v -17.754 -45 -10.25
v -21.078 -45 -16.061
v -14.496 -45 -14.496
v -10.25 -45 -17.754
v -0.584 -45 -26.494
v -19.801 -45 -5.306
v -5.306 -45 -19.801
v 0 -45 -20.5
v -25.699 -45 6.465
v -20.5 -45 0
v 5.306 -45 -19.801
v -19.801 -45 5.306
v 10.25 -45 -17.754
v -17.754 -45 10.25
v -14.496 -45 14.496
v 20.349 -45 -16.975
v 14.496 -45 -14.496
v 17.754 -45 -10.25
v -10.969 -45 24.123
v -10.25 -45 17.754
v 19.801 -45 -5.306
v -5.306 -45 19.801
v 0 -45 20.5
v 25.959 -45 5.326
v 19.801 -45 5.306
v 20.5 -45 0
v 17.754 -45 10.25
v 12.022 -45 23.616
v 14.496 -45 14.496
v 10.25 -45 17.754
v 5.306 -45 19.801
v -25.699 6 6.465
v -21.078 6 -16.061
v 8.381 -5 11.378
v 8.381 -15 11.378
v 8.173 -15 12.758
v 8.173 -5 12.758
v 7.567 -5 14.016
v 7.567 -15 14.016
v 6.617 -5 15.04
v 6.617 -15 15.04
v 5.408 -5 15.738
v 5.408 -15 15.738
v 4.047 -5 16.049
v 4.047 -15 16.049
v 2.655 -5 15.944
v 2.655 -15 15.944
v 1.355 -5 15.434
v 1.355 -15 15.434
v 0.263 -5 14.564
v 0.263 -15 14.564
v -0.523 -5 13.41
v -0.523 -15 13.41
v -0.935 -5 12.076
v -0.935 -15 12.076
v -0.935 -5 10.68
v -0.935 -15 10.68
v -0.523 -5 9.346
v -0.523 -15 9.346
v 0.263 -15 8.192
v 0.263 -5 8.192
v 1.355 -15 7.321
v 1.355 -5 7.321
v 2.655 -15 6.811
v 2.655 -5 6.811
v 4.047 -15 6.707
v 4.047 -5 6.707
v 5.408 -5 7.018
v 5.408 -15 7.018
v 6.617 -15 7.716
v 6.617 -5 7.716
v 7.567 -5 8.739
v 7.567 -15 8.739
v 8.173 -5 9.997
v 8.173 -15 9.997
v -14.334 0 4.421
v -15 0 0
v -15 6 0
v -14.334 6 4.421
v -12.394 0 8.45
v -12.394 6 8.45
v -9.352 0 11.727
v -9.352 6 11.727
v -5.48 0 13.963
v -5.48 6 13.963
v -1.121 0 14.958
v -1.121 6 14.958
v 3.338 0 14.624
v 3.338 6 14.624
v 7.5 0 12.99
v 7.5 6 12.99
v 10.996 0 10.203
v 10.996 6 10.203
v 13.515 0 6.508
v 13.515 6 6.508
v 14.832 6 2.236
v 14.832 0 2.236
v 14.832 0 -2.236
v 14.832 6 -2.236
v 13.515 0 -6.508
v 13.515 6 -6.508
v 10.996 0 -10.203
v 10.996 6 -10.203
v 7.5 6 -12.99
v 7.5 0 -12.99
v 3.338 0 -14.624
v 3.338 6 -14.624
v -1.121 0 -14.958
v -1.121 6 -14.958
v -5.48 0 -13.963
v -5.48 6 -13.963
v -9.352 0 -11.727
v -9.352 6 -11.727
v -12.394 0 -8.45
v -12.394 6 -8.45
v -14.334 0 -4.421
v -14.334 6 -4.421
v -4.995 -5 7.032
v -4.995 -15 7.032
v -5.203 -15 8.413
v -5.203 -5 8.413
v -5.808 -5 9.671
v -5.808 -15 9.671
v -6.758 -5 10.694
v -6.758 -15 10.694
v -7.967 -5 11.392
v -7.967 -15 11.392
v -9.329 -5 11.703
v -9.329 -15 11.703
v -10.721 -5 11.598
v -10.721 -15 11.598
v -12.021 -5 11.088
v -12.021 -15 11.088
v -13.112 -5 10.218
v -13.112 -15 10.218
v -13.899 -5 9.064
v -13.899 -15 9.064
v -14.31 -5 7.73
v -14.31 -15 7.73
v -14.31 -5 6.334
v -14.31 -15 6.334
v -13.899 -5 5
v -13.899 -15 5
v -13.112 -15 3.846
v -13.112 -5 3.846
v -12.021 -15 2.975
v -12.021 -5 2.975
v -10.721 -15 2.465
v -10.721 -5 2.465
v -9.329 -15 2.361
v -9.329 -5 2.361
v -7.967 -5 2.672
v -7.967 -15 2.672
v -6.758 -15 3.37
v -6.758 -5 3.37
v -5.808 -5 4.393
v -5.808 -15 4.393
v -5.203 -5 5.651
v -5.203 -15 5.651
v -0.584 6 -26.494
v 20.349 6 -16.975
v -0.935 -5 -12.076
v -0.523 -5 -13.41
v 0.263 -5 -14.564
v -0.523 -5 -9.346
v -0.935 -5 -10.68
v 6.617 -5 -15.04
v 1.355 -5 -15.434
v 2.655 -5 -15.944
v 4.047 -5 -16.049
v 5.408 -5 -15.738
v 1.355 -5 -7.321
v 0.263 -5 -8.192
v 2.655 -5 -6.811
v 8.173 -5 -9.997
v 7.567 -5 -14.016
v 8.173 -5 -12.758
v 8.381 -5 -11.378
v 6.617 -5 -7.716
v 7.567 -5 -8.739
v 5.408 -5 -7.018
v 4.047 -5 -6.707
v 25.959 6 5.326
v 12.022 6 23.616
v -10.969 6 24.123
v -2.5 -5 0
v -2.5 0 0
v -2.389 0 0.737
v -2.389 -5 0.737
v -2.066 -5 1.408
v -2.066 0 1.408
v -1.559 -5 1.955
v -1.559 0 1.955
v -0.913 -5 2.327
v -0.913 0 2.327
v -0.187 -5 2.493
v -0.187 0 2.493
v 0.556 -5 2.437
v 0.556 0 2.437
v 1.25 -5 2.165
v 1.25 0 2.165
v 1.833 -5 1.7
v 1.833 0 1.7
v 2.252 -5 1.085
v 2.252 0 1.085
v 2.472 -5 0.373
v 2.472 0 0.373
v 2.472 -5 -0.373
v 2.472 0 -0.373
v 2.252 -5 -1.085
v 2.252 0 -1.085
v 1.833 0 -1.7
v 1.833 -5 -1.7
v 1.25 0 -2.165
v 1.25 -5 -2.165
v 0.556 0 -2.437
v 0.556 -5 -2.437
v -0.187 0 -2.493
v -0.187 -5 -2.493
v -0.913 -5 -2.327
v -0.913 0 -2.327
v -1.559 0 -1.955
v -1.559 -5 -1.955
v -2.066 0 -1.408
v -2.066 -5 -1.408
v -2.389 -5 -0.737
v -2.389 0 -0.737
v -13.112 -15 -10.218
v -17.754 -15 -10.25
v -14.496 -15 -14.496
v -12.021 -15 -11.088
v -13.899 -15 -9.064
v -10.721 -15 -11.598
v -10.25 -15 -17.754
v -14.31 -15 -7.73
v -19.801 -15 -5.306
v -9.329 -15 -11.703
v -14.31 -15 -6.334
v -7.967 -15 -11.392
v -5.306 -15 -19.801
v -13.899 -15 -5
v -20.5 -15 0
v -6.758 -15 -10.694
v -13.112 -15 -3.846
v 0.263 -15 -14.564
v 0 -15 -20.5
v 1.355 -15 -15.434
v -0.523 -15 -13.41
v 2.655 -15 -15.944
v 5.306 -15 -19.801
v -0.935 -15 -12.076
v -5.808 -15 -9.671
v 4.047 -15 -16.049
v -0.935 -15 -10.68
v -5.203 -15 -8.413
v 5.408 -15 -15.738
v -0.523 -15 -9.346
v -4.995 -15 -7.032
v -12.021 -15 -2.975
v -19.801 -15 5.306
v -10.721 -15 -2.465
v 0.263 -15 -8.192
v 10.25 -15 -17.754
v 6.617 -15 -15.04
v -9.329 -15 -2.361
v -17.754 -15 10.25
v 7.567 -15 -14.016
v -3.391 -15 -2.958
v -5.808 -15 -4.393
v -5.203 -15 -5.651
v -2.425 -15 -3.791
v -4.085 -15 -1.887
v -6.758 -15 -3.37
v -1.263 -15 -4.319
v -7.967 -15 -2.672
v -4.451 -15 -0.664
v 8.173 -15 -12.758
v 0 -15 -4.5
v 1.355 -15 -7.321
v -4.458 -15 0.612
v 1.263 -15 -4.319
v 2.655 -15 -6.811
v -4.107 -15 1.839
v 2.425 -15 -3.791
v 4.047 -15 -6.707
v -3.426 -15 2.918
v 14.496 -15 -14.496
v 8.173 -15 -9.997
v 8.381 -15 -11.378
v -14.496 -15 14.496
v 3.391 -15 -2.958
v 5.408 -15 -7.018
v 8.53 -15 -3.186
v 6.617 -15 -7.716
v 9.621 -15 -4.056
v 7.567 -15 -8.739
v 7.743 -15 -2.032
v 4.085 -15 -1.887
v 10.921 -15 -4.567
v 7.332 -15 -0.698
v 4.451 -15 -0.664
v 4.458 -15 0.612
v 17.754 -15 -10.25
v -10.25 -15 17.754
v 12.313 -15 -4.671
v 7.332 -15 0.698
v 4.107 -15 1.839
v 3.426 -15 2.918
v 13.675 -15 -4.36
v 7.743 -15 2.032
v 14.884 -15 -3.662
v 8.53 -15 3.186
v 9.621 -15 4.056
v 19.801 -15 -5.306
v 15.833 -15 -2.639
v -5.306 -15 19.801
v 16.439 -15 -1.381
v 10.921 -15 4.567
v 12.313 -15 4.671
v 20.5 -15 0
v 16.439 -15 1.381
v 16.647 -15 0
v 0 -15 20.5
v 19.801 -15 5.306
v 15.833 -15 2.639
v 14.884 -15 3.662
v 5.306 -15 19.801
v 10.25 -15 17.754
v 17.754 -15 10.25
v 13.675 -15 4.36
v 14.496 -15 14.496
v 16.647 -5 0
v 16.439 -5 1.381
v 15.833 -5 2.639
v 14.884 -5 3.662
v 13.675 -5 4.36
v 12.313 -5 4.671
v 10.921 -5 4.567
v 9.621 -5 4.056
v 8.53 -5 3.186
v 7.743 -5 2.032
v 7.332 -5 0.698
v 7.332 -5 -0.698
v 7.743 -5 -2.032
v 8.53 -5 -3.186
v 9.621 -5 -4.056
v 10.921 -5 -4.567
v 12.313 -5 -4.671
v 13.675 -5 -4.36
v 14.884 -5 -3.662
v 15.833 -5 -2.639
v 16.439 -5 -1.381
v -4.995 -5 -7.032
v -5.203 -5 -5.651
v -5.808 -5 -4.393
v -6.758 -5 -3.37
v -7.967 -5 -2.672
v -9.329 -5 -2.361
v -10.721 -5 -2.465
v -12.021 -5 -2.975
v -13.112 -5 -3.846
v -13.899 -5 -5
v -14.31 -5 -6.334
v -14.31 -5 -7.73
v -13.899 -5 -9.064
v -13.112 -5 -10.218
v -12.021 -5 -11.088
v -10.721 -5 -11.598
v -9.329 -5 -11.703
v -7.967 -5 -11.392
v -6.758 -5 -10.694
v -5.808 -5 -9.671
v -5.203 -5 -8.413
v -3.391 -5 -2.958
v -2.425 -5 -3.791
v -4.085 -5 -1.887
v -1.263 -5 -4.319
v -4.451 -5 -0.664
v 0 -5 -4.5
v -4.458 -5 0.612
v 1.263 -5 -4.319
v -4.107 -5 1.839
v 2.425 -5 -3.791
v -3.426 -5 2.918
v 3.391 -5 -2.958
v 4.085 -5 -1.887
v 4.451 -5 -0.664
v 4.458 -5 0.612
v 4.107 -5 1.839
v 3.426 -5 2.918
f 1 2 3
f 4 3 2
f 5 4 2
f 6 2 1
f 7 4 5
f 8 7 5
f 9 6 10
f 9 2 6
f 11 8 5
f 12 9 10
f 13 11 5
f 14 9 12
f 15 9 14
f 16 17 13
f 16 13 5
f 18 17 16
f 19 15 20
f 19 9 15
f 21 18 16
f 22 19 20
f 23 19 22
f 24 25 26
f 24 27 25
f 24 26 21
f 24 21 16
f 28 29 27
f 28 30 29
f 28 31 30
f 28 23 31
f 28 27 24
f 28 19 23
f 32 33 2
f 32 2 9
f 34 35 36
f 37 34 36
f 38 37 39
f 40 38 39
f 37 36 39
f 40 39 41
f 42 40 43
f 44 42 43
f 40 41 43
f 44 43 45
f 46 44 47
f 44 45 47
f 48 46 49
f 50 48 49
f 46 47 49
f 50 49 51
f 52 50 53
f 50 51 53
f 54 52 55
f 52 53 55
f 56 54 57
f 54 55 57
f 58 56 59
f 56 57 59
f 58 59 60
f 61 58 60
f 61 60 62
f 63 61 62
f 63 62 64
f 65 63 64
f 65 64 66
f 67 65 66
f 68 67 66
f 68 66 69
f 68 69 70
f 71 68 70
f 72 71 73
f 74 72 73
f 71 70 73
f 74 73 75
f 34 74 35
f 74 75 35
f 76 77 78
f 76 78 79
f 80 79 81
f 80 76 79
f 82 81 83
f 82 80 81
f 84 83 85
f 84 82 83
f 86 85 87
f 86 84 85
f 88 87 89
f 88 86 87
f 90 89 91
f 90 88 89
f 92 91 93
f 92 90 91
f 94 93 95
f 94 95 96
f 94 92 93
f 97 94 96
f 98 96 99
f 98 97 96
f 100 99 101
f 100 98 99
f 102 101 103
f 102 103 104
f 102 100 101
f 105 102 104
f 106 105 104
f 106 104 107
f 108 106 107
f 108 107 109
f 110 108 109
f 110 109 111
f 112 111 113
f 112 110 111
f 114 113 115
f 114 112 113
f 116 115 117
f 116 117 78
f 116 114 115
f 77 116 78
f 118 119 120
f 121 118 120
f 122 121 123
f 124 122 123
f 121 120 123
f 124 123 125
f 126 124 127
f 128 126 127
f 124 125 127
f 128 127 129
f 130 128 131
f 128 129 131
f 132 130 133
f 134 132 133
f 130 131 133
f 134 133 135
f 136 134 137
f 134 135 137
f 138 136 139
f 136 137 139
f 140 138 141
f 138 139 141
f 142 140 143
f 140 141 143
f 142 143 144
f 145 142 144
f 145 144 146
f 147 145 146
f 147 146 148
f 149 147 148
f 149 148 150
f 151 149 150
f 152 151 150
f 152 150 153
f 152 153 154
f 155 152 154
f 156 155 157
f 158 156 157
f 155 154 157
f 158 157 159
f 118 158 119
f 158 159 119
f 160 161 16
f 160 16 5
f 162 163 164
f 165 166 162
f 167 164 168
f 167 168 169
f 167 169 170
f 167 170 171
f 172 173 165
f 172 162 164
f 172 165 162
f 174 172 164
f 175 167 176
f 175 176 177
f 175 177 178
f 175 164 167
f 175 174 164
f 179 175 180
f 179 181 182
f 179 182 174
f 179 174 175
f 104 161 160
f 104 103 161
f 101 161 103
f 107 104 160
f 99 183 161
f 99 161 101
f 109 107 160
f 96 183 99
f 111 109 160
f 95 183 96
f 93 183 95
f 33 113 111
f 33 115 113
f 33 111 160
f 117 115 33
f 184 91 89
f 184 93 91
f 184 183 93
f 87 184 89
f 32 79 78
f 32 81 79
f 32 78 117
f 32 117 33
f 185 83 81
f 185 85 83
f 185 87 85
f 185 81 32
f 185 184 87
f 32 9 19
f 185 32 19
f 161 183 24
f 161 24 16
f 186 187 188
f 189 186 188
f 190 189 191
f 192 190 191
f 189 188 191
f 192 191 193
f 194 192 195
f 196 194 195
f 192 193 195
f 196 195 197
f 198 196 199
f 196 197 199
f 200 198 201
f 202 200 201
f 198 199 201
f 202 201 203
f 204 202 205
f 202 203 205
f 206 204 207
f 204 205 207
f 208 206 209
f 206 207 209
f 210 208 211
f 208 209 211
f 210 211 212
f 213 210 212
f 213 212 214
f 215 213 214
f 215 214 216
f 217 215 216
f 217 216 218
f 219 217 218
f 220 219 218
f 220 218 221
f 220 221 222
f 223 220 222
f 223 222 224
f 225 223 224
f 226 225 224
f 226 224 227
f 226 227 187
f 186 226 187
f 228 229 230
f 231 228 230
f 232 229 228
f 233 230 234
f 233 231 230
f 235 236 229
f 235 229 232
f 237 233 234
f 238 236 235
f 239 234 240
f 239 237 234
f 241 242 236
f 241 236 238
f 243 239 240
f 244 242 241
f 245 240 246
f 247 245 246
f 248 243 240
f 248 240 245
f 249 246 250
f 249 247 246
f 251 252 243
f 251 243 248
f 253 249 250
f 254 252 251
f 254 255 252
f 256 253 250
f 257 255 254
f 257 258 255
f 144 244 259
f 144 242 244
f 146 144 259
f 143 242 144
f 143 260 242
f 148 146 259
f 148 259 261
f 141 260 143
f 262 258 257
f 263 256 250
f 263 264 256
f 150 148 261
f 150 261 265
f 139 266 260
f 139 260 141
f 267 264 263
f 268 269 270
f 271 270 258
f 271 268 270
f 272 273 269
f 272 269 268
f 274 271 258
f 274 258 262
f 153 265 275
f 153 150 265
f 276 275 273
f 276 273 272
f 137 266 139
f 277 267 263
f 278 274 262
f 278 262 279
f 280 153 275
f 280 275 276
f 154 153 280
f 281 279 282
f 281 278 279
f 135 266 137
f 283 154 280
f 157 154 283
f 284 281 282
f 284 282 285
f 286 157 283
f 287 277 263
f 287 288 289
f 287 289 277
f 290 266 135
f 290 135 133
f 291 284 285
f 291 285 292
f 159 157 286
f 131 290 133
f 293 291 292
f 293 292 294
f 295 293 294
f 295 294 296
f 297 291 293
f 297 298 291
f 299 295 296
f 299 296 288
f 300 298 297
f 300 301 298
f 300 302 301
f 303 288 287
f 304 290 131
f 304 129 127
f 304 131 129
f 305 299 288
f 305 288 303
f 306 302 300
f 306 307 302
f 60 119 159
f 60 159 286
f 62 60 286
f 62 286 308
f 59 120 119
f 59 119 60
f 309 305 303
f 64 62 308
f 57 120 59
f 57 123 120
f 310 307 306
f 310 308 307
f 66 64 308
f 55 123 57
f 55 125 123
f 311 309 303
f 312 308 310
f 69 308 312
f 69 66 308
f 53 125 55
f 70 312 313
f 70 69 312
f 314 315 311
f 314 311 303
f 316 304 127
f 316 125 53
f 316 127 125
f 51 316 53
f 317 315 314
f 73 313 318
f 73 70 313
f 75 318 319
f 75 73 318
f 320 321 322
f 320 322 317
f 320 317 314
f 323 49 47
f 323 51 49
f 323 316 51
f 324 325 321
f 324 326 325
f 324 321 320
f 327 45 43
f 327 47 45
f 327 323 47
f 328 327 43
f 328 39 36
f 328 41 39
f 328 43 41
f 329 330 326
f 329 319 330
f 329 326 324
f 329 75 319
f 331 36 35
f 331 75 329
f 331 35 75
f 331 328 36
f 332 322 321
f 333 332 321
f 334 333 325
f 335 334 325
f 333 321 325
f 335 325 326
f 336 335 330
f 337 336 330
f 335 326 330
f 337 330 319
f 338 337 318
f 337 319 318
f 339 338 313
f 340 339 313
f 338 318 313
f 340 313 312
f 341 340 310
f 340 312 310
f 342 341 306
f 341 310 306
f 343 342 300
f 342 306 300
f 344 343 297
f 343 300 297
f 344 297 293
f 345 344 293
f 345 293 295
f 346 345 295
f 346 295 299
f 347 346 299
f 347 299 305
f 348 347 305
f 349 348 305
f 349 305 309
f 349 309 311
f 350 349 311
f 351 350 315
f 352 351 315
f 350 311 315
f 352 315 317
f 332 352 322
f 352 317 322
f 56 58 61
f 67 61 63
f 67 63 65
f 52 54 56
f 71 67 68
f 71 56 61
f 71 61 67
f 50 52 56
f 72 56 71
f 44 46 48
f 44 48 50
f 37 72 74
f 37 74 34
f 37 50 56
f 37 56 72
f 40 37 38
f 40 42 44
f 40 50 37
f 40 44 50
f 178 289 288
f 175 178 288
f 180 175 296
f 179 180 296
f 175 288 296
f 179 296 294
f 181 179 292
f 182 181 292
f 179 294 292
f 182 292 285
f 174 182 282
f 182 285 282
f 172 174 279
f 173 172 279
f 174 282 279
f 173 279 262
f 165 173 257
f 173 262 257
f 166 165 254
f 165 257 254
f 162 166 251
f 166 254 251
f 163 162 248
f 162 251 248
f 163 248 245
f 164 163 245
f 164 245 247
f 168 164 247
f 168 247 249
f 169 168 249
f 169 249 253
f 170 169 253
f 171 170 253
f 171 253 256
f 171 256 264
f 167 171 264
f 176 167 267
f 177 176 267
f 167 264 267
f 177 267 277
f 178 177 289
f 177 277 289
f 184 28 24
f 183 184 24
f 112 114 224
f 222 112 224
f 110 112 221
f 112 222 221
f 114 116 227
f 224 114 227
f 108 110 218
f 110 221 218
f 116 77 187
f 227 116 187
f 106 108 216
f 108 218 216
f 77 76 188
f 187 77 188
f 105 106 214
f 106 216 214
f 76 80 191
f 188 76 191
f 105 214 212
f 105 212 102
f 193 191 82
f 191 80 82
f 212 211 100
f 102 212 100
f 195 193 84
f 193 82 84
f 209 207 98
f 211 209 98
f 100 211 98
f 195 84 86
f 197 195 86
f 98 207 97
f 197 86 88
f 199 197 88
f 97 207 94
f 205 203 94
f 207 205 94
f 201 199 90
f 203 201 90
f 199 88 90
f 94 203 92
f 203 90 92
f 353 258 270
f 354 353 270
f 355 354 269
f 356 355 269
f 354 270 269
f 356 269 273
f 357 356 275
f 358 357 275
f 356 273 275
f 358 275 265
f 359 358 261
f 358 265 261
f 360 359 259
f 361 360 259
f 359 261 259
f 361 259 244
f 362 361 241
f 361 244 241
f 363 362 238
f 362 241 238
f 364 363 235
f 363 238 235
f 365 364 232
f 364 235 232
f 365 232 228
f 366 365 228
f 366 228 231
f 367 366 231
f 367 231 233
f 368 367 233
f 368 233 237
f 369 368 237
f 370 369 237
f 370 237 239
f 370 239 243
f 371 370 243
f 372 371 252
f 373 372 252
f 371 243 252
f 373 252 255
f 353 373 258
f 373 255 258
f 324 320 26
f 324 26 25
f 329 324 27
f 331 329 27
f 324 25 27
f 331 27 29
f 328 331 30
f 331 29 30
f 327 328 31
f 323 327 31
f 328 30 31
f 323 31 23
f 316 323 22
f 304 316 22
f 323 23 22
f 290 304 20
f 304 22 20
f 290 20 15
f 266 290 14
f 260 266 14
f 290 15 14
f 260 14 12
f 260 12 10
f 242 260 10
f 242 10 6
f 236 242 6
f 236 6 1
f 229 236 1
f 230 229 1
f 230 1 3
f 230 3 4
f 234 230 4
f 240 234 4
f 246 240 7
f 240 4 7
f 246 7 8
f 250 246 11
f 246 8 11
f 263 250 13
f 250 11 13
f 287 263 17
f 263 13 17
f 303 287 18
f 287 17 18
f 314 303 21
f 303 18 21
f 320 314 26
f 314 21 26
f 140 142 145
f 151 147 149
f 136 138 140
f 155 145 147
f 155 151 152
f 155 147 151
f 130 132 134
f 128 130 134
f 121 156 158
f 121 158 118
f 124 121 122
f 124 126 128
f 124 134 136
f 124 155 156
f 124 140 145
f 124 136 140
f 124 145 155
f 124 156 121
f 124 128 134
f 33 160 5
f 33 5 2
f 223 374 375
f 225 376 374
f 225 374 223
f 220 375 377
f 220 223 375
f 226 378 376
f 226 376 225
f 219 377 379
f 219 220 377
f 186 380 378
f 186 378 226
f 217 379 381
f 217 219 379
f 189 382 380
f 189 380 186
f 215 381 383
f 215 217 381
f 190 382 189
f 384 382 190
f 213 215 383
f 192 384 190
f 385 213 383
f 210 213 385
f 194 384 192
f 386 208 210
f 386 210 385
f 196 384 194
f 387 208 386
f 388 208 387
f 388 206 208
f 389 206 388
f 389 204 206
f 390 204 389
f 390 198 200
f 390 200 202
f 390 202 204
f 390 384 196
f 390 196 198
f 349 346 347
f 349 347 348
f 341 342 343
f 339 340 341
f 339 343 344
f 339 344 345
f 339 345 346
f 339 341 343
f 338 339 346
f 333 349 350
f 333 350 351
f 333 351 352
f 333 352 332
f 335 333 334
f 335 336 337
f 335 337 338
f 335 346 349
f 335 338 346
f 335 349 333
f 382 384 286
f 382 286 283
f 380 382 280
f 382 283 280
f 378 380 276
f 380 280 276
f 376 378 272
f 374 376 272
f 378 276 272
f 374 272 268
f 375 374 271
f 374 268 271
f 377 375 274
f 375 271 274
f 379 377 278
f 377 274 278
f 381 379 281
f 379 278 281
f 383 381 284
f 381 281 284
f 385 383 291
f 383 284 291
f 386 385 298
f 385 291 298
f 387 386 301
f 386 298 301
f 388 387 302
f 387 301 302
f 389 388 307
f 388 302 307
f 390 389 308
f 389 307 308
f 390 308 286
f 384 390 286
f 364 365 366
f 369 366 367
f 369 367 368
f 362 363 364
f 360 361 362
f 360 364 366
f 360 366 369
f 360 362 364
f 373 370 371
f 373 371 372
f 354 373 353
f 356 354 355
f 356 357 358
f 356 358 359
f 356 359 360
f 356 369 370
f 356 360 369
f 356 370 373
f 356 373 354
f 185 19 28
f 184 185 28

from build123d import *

# Parameters (mm, degrees)
F0_R      = 26.5
F1_DEPTH  = 45
F2_R      = 20.5
F3_DEPTH  = 30
F4_R      = 2.5
F5_DEPTH  = 45.001
F7_DEPTH  = 10
F9_DEPTH  = 45.001
F10_R     = 15
F11_DEPTH = 6
F12_R     = 4.6840080941
F13_DEPTH = 10


with BuildPart() as f1:
    # F0 (on Front) → F1 (new body)
    with BuildSketch(Plane.XZ):
        Circle(F0_R)
    extrude(amount=F1_DEPTH)

    # F2 (on face) → F3 (cut)
    with BuildSketch(Plane.XZ.offset(45)):
        Circle(F2_R)
    extrude(amount=-F3_DEPTH, mode=Mode.SUBTRACT)

    # F4 (on face) → F5 (cut, through all)
    with BuildSketch(Plane(origin=(0, 0, 0), x_dir=(-1, 0, 0), z_dir=(0, 1, 0))):
        Circle(F4_R)
    extrude(amount=-F5_DEPTH, mode=Mode.SUBTRACT)

    # F6 (on face) → F7 (cut)
    with BuildSketch(Plane.XZ.offset(15)):
        with BuildLine():
            Line((3.4260696722, 2.917541191), (-3.4260696722, 2.917541191))
            ThreePointArc((-3.4260696722, 2.917541191), (0, -4.5), (3.4260696722, 2.917541191))
        make_face()
    extrude(amount=-F7_DEPTH, mode=Mode.SUBTRACT)

    # F8 (on face) → F9 (cut, through all)
    with BuildSketch(Plane(origin=(0, 0, 0), x_dir=(-1, 0, 0), z_dir=(0, 1, 0))):
        with BuildLine():
            Line((-25.9593629808, 5.325549139), (-12.0217161029, 23.6162728207))
            ThreePointArc((-12.0217161029, 23.6162728207), (-21.077908703, 16.061499454), (-25.9593629808, 5.325549139))
        make_face()
        with BuildLine():
            ThreePointArc((10.9685281987, 24.1234613842), (-0.584475192, 26.4935537207), (-12.0217161029, 23.6162728207))
            Line((-12.0217161029, 23.6162728207), (10.9685281987, 24.1234613842))
        make_face()
        with BuildLine():
            ThreePointArc((25.6992470496, 6.4651914964), (20.3490800596, 16.9754216657), (10.9685281987, 24.1234613842))
            Line((10.9685281987, 24.1234613842), (25.6992470496, 6.4651914964))
        make_face()
        with BuildLine():
            ThreePointArc((26.5, 0), (26.2990498575, 3.257295902), (25.6992470496, 6.4651914964))
            Line((25.6992470496, 6.4651914964), (21.077908703, -16.061499454))
            ThreePointArc((21.077908703, -16.061499454), (25.1079129024, -8.4760078861), (26.5, 0))
        make_face()
        with BuildLine():
            ThreePointArc((0.584475192, -26.4935537207), (12.0217161029, -23.6162728207), (21.077908703, -16.061499454))
            Line((21.077908703, -16.061499454), (0.584475192, -26.4935537207))
        make_face()
        with BuildLine():
            Line((0.584475192, -26.4935537207), (-20.3490800596, -16.9754216657))
            ThreePointArc((-20.3490800596, -16.9754216657), (-10.9685281987, -24.1234613842), (0.584475192, -26.4935537207))
        make_face()
        with BuildLine():
            Line((-20.3490800596, -16.9754216657), (-25.9593629808, 5.325549139))
            ThreePointArc((-25.9593629808, 5.325549139), (-25.6992470496, -6.4651914964), (-20.3490800596, -16.9754216657))
        make_face()
    extrude(amount=-F9_DEPTH, mode=Mode.SUBTRACT)

    # F10 (on face) → F11 (join)
    with BuildSketch(Plane(origin=(0, 0, 0), x_dir=(-1, 0, 0), z_dir=(0, 1, 0))):
        Polygon((-12.0217161029, 23.6162728207), (-25.9593629808, 5.325549139), (-20.3490800596, -16.9754216657), (0.584475192, -26.4935537207), (21.077908703, -16.061499454), (25.6992470496, 6.4651914964), (10.9685281987, 24.1234613842), align=None)
        Circle(F10_R, mode=Mode.SUBTRACT)
    extrude(amount=F11_DEPTH)

    # F12 (on face) → F13 (cut)
    with BuildSketch(Plane.XZ.offset(15)):
        with Locations((11.9633907452, 0)):
            Circle(F12_R)
        with Locations((3.6968910506, 11.3778607252)):
            Circle(F12_R)
        with Locations((-9.6785864232, 7.0319046475)):
            Circle(F12_R)
        with Locations((-9.6785864232, -7.0319046475)):
            Circle(F12_R)
        with Locations((3.6968910506, -11.3778607252)):
            Circle(F12_R)
    extrude(amount=-F13_DEPTH, mode=Mode.SUBTRACT)


solid = f1.part
